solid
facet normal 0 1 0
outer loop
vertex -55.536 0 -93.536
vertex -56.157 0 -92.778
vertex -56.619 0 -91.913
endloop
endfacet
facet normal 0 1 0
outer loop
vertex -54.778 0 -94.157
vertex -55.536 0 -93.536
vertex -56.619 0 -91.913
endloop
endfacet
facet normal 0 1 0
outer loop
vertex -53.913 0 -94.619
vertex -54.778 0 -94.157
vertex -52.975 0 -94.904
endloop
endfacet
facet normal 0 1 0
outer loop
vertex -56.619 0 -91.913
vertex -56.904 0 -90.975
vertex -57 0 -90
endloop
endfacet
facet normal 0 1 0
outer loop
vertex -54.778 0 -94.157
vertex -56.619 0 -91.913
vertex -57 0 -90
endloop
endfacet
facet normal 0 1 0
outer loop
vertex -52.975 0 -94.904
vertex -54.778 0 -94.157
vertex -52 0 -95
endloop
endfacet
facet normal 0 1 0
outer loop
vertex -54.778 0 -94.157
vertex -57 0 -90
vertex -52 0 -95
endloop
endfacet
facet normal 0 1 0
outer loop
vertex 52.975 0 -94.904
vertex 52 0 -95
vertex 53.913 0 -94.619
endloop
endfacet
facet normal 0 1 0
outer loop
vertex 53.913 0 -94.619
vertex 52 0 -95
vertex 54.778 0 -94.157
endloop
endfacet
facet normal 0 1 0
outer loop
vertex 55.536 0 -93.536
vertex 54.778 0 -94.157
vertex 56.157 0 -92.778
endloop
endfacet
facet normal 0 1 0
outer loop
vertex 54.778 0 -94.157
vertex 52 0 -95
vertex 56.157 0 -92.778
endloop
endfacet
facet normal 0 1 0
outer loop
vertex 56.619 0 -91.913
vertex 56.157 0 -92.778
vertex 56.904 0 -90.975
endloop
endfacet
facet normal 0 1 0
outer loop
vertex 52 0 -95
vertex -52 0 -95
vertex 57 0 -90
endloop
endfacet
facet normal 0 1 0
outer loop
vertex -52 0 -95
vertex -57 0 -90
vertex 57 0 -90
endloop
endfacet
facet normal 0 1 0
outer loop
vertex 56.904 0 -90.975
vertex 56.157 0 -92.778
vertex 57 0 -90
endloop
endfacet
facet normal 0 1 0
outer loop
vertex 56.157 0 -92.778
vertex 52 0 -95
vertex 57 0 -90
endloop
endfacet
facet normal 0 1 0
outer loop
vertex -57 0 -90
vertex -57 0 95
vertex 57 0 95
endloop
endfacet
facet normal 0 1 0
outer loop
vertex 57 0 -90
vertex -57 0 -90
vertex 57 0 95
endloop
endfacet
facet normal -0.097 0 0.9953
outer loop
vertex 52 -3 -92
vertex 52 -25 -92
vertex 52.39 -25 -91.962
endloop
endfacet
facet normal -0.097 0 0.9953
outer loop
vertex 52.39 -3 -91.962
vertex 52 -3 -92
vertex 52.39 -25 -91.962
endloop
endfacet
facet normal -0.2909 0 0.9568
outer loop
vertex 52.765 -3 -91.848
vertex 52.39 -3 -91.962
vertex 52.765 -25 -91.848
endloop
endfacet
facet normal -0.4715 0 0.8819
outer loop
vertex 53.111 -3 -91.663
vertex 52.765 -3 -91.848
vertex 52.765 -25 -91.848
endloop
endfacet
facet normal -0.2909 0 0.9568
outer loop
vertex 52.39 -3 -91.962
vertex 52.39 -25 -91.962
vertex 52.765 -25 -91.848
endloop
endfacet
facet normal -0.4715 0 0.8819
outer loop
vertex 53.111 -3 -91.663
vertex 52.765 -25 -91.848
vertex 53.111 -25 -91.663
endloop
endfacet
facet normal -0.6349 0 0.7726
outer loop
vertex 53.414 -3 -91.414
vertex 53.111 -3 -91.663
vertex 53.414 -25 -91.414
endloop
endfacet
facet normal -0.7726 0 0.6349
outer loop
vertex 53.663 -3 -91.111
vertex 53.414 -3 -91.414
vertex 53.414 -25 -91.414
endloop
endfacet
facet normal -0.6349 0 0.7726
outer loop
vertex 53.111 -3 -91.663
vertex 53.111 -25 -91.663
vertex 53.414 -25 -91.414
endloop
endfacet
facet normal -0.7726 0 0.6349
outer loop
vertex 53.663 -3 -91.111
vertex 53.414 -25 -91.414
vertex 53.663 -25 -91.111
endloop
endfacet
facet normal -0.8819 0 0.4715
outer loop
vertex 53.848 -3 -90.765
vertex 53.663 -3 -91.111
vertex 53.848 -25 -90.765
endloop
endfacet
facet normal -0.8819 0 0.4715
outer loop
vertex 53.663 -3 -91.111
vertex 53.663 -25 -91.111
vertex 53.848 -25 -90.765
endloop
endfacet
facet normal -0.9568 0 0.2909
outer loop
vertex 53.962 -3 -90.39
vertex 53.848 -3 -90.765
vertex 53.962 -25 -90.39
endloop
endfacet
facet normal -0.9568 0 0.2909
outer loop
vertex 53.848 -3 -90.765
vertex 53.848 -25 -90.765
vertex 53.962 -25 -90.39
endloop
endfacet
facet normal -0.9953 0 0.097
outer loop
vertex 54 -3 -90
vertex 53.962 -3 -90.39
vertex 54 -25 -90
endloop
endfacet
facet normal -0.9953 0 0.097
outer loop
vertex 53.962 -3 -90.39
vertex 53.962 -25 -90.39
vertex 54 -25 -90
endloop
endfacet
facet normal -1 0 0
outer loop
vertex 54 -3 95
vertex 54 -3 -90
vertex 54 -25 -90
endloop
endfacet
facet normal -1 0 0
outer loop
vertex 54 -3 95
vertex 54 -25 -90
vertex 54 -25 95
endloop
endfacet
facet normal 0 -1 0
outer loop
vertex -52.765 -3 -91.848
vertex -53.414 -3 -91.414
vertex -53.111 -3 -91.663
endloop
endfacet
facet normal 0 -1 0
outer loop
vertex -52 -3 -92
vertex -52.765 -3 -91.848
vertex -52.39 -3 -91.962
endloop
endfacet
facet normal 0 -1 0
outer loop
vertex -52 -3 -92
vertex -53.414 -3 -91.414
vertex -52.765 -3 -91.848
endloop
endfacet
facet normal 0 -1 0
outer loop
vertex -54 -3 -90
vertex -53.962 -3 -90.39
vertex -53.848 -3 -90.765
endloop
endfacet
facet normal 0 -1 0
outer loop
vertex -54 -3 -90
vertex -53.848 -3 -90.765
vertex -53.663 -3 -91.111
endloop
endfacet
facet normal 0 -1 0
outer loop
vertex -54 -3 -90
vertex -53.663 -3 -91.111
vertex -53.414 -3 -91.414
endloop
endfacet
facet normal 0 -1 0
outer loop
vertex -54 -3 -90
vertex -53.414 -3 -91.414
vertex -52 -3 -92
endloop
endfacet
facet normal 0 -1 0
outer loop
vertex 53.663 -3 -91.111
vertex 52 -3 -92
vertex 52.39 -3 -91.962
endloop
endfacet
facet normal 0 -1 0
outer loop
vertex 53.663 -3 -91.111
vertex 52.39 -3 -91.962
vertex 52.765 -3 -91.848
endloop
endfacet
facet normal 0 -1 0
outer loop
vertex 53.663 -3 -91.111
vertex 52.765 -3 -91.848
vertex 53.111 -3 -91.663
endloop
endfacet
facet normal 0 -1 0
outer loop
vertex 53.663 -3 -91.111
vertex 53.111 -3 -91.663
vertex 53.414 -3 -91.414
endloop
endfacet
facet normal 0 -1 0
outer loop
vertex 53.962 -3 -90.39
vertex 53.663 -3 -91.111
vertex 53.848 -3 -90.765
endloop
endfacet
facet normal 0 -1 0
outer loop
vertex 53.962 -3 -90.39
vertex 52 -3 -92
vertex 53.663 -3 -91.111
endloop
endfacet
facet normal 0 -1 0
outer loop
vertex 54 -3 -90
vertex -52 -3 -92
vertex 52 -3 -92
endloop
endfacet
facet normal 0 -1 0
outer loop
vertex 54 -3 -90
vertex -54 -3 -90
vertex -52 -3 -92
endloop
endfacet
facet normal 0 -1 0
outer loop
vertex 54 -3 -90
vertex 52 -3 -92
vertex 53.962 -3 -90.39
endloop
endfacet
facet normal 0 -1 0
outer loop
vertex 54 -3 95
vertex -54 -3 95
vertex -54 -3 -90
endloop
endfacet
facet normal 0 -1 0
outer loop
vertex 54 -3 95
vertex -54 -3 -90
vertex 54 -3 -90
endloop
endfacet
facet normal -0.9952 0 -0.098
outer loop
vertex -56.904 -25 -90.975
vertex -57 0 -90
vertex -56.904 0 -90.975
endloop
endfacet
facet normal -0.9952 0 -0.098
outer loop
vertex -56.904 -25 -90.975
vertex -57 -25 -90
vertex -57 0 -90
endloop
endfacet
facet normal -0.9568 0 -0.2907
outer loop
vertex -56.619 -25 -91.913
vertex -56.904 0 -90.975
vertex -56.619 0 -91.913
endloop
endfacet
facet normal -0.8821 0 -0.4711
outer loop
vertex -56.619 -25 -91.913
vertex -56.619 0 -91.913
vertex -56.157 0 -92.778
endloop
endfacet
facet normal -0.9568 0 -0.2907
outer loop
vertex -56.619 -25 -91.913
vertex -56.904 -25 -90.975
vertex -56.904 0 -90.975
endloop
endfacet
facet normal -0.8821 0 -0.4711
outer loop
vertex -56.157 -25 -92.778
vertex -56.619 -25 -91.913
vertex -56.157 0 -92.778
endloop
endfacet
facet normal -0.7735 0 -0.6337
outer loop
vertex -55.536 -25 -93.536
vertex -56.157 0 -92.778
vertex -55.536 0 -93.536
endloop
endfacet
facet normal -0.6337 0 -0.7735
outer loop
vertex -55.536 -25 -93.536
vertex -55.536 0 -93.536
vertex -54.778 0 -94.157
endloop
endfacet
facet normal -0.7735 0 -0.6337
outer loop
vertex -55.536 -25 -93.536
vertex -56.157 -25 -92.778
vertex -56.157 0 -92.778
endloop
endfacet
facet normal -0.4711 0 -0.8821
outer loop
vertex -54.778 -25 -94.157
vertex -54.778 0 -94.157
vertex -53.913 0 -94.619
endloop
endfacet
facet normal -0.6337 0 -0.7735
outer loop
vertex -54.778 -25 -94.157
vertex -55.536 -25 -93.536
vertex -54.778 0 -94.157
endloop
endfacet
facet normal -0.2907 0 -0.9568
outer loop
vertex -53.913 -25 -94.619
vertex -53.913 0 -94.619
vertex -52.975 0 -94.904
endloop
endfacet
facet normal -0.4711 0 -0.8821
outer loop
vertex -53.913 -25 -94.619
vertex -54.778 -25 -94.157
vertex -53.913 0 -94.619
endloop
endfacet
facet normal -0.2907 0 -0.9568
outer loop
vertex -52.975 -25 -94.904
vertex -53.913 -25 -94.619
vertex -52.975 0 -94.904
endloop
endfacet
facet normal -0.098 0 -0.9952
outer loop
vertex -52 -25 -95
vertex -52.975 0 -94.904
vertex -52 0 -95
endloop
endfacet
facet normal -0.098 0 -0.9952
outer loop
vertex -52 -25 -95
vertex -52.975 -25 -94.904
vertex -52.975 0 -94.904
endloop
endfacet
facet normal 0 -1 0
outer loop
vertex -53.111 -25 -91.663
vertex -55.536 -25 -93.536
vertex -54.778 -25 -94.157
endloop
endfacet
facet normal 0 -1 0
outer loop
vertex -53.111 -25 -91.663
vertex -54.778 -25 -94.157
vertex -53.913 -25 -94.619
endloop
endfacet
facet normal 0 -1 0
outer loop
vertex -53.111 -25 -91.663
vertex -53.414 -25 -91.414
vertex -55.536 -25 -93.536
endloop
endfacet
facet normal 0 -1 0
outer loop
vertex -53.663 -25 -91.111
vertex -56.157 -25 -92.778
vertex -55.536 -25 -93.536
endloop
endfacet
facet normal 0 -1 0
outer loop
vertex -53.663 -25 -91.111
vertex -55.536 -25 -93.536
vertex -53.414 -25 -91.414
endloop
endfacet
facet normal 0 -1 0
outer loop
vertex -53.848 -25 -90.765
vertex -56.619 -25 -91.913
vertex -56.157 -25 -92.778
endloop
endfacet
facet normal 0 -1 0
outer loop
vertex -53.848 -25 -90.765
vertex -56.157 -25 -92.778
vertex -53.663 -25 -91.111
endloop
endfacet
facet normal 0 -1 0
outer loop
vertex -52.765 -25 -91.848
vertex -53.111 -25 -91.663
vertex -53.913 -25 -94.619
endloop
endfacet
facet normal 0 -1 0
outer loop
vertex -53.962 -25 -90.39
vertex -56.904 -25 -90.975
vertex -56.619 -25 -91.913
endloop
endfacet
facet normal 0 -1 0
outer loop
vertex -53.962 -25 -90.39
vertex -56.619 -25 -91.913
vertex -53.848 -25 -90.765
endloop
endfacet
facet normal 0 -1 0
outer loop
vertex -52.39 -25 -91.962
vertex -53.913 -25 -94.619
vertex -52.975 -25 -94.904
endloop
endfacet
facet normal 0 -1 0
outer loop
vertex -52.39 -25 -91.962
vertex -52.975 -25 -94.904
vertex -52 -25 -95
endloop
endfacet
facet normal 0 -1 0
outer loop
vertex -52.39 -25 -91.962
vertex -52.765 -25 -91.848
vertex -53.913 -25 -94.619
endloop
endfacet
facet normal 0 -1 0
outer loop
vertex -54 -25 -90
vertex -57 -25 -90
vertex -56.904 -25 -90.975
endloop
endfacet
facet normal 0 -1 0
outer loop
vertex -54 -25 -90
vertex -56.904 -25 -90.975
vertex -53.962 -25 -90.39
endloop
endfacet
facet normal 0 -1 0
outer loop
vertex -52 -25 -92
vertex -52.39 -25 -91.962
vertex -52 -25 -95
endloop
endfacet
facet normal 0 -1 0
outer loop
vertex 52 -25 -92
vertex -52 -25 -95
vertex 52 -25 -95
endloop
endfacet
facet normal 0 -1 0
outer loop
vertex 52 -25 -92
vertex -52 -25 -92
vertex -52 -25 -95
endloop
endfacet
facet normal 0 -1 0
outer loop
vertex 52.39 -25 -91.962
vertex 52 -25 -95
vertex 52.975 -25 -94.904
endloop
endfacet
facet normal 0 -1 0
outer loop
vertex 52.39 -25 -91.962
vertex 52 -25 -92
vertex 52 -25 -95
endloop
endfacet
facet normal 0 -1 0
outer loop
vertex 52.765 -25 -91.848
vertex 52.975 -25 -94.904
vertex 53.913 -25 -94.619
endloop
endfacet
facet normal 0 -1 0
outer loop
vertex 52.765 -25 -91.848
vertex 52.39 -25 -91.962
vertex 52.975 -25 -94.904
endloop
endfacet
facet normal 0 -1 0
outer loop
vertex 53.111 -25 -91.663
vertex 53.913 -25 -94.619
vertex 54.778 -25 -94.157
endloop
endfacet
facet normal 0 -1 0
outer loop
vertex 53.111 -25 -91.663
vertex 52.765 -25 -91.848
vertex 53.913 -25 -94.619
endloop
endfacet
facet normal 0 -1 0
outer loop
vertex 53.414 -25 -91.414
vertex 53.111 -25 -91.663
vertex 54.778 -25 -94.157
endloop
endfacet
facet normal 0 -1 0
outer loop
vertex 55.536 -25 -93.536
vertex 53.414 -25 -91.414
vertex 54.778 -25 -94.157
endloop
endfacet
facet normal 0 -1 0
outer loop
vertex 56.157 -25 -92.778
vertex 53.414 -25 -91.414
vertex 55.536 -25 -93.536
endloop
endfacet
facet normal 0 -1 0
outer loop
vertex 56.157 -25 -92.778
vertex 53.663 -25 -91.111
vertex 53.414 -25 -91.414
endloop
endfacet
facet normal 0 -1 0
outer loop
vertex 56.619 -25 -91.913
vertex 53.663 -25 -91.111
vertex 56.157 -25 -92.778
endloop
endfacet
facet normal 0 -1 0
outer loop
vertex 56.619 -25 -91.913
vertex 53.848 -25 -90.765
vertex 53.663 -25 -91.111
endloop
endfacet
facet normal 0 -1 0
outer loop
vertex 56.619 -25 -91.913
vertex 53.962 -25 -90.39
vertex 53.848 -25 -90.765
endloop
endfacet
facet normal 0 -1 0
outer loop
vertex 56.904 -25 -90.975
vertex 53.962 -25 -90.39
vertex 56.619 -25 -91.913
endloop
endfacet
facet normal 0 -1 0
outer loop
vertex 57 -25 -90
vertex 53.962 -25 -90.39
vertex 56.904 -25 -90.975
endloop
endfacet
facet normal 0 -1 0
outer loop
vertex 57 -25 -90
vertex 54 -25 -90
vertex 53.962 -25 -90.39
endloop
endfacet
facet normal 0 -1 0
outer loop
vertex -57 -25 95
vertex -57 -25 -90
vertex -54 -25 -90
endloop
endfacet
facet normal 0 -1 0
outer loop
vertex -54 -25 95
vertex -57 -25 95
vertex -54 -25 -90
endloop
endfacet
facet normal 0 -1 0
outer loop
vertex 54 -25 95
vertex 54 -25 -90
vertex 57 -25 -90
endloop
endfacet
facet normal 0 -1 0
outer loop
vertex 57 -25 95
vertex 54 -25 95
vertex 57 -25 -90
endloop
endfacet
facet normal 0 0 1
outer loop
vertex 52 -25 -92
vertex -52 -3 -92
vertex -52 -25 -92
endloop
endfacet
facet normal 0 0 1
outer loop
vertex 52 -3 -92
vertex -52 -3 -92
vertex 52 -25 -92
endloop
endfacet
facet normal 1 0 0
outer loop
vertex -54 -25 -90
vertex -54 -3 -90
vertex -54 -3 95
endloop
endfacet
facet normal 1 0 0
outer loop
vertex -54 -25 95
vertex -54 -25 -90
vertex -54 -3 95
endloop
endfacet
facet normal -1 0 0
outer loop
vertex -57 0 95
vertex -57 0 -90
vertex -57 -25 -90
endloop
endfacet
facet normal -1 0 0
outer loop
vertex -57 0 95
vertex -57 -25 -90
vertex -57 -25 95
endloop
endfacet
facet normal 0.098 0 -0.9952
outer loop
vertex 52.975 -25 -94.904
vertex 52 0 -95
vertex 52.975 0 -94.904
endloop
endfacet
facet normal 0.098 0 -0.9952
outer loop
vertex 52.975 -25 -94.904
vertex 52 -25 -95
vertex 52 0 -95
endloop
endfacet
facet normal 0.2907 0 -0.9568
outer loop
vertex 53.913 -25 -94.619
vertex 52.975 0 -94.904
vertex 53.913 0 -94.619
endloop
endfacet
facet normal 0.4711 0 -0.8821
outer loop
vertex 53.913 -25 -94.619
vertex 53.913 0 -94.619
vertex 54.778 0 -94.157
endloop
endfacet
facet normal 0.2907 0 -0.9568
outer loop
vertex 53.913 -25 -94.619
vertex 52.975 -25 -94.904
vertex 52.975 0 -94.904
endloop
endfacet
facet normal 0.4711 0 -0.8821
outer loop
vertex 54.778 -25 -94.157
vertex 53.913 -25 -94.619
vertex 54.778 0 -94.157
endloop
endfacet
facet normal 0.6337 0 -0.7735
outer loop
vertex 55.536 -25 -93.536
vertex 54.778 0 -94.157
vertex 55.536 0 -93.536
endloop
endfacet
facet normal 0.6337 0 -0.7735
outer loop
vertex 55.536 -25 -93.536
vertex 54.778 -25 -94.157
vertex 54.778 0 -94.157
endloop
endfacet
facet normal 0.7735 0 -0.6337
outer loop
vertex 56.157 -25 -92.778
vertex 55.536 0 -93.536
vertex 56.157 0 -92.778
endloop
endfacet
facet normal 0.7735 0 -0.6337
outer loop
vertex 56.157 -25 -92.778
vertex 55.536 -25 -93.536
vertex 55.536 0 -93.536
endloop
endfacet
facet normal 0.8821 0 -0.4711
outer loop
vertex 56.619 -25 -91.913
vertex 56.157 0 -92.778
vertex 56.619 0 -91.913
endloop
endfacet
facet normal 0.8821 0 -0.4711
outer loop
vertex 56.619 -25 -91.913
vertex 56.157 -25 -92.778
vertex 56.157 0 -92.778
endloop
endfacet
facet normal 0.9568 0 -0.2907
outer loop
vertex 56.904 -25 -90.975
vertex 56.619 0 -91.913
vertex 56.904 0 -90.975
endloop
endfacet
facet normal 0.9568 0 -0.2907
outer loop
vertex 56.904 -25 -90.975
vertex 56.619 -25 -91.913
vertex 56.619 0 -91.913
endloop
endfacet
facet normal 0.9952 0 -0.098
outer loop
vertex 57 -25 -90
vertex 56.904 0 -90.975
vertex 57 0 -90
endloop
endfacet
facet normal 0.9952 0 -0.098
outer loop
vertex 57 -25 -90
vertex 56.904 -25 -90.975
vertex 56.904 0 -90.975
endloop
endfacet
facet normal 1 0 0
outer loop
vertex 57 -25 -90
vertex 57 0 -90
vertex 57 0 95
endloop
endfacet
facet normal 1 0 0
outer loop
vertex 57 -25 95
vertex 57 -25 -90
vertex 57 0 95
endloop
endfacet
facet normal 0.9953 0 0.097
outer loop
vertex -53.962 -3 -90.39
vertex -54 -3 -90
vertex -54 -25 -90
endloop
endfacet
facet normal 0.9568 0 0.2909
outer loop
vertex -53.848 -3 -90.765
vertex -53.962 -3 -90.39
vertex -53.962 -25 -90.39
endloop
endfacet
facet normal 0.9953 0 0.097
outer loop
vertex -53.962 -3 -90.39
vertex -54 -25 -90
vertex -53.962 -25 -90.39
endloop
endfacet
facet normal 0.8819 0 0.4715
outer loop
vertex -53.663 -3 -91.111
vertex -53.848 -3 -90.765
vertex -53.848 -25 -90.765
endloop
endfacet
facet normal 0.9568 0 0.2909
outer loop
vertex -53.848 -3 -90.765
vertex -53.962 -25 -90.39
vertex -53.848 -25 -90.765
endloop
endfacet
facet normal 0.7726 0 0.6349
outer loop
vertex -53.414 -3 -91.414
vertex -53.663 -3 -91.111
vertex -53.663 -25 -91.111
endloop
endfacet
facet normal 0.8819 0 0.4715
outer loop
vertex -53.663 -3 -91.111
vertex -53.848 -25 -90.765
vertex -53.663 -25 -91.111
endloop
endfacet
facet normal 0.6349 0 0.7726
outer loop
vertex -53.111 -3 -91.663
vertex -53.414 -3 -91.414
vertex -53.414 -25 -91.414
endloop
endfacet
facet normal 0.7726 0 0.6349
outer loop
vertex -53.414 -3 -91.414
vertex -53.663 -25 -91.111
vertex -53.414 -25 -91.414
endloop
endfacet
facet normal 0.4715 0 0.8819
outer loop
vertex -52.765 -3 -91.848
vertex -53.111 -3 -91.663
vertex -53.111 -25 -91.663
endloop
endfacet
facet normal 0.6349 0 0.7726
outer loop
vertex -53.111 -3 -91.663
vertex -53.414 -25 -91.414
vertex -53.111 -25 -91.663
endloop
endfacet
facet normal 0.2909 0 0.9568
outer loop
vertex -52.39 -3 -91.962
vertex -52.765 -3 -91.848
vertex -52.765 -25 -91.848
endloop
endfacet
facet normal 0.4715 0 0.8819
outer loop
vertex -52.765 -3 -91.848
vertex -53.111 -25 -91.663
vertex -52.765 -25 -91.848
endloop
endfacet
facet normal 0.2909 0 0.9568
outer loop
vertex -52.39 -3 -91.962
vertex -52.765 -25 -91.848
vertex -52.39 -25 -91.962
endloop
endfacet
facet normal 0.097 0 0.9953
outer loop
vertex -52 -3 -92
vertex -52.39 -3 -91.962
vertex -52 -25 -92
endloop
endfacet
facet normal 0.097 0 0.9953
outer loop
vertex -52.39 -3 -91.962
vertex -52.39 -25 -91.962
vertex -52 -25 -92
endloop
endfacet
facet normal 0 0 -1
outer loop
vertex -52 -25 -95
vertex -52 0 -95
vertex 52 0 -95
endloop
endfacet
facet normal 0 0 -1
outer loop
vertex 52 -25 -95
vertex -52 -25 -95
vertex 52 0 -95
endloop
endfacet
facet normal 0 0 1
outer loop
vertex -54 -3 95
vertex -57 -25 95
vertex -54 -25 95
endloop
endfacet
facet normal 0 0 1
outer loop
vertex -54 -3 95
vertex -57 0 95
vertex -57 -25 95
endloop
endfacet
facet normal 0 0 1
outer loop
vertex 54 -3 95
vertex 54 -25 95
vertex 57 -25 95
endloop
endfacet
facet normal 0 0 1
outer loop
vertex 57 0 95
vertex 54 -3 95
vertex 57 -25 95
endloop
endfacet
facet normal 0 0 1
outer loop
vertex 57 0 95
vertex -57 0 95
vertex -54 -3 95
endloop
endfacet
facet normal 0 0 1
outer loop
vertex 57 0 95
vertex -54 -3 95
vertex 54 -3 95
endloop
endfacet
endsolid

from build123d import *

# Parameters (mm, degrees)
F0_W     = 114
F0_H     = 190
F1_DEPTH = 25
F2_R     = 5
F3_T     = -3


with BuildPart() as f1:
    # F0 (on Front) → F1 (new body)
    with BuildSketch(Plane.XZ):
        Rectangle(F0_W, F0_H)
    extrude(amount=F1_DEPTH)

    # F2
    f2_edges = [f1.edges().sort_by_distance(p)[0] for p in [
        (57, -12.5, -95),
        (-57, -12.5, -95),
    ]]
    fillet(f2_edges, radius=F2_R)

    # F3
    f3_openings = [f1.faces().sort_by_distance(p)[0] for p in [
        (0, -25, 0.046532),
        (0, -12.5, 95),
    ]]
    offset(amount=F3_T, openings=f3_openings)


solid = f1.part
